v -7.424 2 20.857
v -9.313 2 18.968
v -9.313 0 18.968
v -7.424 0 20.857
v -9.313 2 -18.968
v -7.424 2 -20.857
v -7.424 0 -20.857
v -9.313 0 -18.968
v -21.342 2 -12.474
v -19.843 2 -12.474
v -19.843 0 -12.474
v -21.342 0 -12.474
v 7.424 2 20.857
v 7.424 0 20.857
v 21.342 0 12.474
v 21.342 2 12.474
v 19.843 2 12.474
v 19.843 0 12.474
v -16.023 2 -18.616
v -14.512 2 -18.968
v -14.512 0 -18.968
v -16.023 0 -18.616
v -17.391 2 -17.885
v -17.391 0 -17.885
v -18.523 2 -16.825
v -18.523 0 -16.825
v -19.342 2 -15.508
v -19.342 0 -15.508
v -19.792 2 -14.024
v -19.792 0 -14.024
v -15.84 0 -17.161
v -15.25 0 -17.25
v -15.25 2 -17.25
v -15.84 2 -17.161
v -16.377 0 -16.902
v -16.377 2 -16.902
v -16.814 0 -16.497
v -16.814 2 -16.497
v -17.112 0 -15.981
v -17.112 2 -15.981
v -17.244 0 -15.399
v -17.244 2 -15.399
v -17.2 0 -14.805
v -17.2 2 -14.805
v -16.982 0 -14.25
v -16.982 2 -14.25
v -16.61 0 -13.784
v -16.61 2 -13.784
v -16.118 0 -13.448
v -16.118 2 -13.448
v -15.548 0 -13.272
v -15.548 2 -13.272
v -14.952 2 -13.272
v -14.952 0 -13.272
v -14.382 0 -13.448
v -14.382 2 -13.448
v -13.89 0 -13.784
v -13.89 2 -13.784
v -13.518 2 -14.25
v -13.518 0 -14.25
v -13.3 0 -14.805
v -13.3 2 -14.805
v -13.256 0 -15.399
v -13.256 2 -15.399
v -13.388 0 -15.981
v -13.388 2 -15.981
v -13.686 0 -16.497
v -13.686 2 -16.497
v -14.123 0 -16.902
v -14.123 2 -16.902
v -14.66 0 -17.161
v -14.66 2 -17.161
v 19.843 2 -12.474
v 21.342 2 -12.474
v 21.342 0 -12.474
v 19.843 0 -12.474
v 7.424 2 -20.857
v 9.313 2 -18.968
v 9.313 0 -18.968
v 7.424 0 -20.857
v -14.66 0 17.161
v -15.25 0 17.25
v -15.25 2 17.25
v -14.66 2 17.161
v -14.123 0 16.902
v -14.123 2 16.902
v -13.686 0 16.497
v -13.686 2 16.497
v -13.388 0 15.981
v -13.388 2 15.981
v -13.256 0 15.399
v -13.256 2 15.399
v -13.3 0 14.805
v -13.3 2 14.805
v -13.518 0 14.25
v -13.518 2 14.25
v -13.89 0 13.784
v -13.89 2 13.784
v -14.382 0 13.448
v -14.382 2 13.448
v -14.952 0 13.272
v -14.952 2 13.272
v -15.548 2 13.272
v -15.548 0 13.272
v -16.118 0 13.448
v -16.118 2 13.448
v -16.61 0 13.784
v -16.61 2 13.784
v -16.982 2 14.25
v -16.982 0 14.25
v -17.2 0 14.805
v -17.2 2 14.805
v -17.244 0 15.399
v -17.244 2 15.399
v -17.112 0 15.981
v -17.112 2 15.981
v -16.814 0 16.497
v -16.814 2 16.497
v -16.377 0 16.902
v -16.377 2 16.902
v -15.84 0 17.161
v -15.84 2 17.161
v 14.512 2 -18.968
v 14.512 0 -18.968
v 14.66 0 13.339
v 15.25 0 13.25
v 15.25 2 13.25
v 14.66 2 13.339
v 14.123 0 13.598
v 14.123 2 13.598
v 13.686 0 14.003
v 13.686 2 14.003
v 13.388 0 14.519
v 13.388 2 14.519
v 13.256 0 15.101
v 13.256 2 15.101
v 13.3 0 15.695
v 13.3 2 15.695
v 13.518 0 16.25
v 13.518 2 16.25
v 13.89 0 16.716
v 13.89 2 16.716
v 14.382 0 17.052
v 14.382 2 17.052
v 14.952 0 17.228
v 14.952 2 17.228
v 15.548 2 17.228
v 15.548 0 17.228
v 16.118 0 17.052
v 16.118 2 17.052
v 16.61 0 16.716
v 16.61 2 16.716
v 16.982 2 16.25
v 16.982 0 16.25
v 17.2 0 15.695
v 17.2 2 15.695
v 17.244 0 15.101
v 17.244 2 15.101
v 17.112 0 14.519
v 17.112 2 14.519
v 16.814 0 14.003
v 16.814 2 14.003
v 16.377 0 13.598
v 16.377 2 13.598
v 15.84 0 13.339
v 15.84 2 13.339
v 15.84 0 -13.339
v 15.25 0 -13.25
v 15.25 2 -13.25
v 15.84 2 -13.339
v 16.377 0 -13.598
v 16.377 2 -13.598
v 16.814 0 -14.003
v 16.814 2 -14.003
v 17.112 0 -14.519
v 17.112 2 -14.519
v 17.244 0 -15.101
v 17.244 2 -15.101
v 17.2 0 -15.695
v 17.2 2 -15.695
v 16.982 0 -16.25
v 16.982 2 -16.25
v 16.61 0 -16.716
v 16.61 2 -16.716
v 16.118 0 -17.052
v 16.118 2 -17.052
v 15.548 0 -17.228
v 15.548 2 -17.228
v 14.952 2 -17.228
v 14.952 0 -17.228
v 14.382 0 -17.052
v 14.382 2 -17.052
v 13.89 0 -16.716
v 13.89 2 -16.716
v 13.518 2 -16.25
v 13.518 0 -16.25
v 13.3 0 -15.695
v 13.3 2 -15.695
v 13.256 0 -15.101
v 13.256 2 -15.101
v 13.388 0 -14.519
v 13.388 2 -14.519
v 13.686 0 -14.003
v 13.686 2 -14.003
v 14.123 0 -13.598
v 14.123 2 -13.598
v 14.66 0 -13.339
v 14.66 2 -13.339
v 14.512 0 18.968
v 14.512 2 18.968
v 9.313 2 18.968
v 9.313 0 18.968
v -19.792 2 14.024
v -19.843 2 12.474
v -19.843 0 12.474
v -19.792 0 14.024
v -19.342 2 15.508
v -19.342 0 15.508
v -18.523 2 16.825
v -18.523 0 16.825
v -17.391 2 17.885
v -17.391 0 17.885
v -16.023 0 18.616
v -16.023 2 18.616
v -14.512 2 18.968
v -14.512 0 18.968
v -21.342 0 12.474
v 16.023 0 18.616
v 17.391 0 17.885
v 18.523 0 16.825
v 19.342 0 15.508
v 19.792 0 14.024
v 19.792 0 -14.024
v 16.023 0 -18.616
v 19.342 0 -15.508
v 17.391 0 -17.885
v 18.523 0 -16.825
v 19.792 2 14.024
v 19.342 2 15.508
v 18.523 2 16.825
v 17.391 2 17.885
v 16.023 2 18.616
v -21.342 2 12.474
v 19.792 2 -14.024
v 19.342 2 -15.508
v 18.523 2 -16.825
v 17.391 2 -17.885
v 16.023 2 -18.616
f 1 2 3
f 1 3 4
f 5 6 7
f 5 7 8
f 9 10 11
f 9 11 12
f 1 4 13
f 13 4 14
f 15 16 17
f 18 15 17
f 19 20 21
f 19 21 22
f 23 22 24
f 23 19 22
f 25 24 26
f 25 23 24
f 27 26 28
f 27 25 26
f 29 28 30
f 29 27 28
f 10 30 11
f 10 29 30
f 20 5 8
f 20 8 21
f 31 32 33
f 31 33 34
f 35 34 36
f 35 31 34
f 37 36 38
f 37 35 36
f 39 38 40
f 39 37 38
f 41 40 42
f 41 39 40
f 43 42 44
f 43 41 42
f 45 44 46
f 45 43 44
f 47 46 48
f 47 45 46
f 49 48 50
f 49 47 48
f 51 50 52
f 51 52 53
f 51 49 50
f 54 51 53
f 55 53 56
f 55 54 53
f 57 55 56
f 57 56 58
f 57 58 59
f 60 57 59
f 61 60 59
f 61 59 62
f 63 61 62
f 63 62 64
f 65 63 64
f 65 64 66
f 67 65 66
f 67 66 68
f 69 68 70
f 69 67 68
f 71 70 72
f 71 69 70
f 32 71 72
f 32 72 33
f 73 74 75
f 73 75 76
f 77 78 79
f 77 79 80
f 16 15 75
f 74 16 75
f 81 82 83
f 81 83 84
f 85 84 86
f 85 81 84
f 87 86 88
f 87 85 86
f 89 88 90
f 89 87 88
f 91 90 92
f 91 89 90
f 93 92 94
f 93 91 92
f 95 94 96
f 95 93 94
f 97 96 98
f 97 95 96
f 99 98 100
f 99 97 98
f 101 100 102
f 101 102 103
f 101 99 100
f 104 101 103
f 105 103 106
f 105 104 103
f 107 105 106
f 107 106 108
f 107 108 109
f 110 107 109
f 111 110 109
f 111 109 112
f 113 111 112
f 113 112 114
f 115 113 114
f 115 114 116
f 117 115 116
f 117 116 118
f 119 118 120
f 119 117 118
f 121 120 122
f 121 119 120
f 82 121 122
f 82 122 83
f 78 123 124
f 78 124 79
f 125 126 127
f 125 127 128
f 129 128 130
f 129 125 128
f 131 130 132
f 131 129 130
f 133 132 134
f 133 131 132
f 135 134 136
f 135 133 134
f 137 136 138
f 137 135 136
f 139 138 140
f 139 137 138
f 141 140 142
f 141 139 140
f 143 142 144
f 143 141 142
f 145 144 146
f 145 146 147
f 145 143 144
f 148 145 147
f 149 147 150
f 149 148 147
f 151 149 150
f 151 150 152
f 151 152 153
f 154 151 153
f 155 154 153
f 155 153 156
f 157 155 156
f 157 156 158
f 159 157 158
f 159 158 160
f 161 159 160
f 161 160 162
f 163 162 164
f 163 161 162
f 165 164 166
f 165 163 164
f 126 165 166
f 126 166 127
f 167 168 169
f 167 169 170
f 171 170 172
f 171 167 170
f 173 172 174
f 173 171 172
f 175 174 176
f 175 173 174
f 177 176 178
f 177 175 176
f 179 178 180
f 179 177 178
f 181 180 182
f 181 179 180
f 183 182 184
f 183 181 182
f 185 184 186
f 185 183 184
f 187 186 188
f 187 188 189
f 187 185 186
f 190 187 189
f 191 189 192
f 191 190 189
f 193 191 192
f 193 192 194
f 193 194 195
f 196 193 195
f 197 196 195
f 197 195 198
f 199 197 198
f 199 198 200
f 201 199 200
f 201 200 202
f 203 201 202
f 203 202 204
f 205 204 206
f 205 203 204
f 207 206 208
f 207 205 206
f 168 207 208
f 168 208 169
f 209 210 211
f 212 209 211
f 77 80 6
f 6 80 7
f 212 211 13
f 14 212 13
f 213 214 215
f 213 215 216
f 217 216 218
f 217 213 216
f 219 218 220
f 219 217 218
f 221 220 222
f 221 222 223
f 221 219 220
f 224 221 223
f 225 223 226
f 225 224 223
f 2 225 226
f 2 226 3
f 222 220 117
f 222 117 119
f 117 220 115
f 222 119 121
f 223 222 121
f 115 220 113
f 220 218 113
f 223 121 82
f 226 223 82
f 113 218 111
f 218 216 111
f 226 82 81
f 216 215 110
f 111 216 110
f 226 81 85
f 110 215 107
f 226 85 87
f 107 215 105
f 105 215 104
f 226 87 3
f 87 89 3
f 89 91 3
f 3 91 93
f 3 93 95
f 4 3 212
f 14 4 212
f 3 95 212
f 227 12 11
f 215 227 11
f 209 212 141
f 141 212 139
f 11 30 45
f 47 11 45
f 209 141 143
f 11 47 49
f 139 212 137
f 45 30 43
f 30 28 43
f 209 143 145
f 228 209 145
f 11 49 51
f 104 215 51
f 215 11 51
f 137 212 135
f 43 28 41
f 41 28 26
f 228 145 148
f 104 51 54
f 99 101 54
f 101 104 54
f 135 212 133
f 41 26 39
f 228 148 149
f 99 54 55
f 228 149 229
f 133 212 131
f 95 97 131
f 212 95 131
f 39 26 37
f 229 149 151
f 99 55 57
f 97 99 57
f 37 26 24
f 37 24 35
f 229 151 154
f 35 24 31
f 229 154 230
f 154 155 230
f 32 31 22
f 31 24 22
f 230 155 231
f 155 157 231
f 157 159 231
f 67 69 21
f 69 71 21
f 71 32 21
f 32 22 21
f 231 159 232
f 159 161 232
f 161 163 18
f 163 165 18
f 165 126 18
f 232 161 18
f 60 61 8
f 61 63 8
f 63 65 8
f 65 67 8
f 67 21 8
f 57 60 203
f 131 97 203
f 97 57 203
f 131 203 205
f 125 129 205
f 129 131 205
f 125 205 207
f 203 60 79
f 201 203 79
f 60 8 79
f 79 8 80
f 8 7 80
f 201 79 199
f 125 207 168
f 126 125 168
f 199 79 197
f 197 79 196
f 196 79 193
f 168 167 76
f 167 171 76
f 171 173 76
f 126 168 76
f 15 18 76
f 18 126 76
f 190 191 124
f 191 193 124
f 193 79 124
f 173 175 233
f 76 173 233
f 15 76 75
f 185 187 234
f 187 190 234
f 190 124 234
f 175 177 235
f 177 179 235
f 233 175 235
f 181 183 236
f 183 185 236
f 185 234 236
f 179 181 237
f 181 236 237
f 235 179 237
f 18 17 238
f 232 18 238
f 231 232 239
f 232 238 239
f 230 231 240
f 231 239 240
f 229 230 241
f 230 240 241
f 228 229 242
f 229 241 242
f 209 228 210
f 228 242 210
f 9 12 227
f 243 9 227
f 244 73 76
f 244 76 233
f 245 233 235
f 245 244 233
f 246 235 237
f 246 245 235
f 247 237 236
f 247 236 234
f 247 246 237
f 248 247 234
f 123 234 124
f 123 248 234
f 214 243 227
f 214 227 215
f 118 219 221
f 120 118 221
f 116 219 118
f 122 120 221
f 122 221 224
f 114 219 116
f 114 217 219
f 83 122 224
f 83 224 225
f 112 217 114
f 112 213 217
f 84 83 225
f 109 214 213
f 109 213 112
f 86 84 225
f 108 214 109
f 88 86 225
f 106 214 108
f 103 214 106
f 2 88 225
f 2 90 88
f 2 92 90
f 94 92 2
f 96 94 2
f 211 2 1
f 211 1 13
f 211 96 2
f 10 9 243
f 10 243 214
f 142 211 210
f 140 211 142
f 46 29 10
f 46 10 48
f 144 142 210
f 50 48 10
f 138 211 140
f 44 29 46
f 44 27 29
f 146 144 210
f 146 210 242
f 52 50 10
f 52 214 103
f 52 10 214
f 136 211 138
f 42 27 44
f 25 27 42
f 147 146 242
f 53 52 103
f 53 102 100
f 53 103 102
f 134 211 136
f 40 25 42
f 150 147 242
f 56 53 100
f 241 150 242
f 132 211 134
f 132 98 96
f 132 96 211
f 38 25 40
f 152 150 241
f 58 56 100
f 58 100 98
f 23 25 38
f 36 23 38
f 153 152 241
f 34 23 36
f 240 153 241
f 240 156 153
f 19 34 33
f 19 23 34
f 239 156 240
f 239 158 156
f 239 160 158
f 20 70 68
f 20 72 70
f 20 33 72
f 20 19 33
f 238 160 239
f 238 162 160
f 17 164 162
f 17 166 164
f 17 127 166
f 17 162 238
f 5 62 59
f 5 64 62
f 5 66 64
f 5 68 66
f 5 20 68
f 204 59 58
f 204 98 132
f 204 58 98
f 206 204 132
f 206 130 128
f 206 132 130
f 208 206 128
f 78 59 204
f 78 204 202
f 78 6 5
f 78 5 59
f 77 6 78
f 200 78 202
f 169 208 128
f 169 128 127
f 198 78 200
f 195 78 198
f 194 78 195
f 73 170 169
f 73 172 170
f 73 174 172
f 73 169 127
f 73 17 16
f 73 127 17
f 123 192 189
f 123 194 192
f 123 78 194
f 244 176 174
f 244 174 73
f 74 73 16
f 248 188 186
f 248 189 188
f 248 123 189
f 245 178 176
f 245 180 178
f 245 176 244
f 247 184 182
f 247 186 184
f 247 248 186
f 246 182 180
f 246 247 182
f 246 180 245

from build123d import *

# Parameters (mm, degrees)
SKETCH_1_R          = 2
EXTRUDE_1_DEPTH     = 2
CUT_EXTRUDE_1_DEPTH = 30.908699941


with BuildPart() as part:
    # 草图1 → 凸台-拉伸1 (new body)
    with BuildSketch(Plane(origin=(0, 0, 0), x_dir=(1, 0, 0), z_dir=(0, 1, 0))):
        Polygon((-19.887274719, -20.85738568), (19.887274719, -20.85738568), (21.342441161, -19.402219238), (21.342441161, 19.402219238), (19.887274719, 20.85738568), (-19.887274719, 20.85738568), (-21.342441161, 19.402219238), (-21.342441161, -19.402219238), align=None)
        with Locations(Location((15.25, 15.25, 0), (0, 0, 270))):
            Circle(SKETCH_1_R, mode=Mode.SUBTRACT)
        with Locations(Location((-15.25, 15.25, 0), (0, 0, 90))):
            Circle(SKETCH_1_R, mode=Mode.SUBTRACT)
        with Locations(Location((15.25, -15.25, 0), (0, 0, 90))):
            Circle(SKETCH_1_R, mode=Mode.SUBTRACT)
        with Locations(Location((-15.25, -15.25, 0), (0, 0, 270))):
            Circle(SKETCH_1_R, mode=Mode.SUBTRACT)
    extrude(amount=EXTRUDE_1_DEPTH)

    # 草图2 → 切除-拉伸1 (cut, through all)
    with BuildSketch(Plane(origin=(0, 2, 0), x_dir=(1, 0, 0), z_dir=(0, 1, 0))):
        with BuildLine():
            Line((-19.842796432, 12.473949701), (-21.342441161, 12.473949701))
            Line((-21.342441161, 12.473949701), (-21.342441161, 20.85738568))
            Line((-21.342441161, 20.85738568), (-7.423925003, 20.85738568))
            Line((-7.423925003, 20.85738568), (-9.313125328, 18.968185355))
            Line((-9.313125328, 18.968185355), (-14.512267744, 18.968185355))
            ThreePointArc((-14.512267744, 18.968185355), (-18.522532331, 16.825056167), (-19.842796432, 12.473949701))
        make_face()
        with BuildLine():
            Line((7.423925003, 20.85738568), (21.342441161, 20.85738568))
            Line((21.342441161, 20.85738568), (21.342441161, 12.473949701))
            Line((21.342441161, 12.473949701), (19.842796432, 12.473949701))
            ThreePointArc((19.842796432, 12.473949701), (18.522532331, 16.825056167), (14.512267744, 18.968185355))
            Line((14.512267744, 18.968185355), (9.313125328, 18.968185355))
            Line((9.313125328, 18.968185355), (7.423925003, 20.85738568))
        make_face()
        with BuildLine():
            Line((9.313125328, -18.968185355), (7.423925003, -20.85738568))
            Line((7.423925003, -20.85738568), (21.342441161, -20.85738568))
            Line((21.342441161, -20.85738568), (21.342441161, -12.473949701))
            Line((21.342441161, -12.473949701), (19.842796432, -12.473949701))
            ThreePointArc((19.842796432, -12.473949701), (18.522532331, -16.825056167), (14.512267744, -18.968185355))
            Line((14.512267744, -18.968185355), (9.313125328, -18.968185355))
        make_face()
        with BuildLine():
            Line((-7.423925003, -20.85738568), (-21.342441161, -20.85738568))
            Line((-21.342441161, -20.85738568), (-21.342441161, -12.473949701))
            Line((-21.342441161, -12.473949701), (-19.842796432, -12.473949701))
            ThreePointArc((-19.842796432, -12.473949701), (-18.522532331, -16.825056167), (-14.512267744, -18.968185355))
            Line((-14.512267744, -18.968185355), (-9.313125328, -18.968185355))
            Line((-9.313125328, -18.968185355), (-7.423925003, -20.85738568))
        make_face()
    extrude(amount=-CUT_EXTRUDE_1_DEPTH, mode=Mode.SUBTRACT)


solid = part.part
